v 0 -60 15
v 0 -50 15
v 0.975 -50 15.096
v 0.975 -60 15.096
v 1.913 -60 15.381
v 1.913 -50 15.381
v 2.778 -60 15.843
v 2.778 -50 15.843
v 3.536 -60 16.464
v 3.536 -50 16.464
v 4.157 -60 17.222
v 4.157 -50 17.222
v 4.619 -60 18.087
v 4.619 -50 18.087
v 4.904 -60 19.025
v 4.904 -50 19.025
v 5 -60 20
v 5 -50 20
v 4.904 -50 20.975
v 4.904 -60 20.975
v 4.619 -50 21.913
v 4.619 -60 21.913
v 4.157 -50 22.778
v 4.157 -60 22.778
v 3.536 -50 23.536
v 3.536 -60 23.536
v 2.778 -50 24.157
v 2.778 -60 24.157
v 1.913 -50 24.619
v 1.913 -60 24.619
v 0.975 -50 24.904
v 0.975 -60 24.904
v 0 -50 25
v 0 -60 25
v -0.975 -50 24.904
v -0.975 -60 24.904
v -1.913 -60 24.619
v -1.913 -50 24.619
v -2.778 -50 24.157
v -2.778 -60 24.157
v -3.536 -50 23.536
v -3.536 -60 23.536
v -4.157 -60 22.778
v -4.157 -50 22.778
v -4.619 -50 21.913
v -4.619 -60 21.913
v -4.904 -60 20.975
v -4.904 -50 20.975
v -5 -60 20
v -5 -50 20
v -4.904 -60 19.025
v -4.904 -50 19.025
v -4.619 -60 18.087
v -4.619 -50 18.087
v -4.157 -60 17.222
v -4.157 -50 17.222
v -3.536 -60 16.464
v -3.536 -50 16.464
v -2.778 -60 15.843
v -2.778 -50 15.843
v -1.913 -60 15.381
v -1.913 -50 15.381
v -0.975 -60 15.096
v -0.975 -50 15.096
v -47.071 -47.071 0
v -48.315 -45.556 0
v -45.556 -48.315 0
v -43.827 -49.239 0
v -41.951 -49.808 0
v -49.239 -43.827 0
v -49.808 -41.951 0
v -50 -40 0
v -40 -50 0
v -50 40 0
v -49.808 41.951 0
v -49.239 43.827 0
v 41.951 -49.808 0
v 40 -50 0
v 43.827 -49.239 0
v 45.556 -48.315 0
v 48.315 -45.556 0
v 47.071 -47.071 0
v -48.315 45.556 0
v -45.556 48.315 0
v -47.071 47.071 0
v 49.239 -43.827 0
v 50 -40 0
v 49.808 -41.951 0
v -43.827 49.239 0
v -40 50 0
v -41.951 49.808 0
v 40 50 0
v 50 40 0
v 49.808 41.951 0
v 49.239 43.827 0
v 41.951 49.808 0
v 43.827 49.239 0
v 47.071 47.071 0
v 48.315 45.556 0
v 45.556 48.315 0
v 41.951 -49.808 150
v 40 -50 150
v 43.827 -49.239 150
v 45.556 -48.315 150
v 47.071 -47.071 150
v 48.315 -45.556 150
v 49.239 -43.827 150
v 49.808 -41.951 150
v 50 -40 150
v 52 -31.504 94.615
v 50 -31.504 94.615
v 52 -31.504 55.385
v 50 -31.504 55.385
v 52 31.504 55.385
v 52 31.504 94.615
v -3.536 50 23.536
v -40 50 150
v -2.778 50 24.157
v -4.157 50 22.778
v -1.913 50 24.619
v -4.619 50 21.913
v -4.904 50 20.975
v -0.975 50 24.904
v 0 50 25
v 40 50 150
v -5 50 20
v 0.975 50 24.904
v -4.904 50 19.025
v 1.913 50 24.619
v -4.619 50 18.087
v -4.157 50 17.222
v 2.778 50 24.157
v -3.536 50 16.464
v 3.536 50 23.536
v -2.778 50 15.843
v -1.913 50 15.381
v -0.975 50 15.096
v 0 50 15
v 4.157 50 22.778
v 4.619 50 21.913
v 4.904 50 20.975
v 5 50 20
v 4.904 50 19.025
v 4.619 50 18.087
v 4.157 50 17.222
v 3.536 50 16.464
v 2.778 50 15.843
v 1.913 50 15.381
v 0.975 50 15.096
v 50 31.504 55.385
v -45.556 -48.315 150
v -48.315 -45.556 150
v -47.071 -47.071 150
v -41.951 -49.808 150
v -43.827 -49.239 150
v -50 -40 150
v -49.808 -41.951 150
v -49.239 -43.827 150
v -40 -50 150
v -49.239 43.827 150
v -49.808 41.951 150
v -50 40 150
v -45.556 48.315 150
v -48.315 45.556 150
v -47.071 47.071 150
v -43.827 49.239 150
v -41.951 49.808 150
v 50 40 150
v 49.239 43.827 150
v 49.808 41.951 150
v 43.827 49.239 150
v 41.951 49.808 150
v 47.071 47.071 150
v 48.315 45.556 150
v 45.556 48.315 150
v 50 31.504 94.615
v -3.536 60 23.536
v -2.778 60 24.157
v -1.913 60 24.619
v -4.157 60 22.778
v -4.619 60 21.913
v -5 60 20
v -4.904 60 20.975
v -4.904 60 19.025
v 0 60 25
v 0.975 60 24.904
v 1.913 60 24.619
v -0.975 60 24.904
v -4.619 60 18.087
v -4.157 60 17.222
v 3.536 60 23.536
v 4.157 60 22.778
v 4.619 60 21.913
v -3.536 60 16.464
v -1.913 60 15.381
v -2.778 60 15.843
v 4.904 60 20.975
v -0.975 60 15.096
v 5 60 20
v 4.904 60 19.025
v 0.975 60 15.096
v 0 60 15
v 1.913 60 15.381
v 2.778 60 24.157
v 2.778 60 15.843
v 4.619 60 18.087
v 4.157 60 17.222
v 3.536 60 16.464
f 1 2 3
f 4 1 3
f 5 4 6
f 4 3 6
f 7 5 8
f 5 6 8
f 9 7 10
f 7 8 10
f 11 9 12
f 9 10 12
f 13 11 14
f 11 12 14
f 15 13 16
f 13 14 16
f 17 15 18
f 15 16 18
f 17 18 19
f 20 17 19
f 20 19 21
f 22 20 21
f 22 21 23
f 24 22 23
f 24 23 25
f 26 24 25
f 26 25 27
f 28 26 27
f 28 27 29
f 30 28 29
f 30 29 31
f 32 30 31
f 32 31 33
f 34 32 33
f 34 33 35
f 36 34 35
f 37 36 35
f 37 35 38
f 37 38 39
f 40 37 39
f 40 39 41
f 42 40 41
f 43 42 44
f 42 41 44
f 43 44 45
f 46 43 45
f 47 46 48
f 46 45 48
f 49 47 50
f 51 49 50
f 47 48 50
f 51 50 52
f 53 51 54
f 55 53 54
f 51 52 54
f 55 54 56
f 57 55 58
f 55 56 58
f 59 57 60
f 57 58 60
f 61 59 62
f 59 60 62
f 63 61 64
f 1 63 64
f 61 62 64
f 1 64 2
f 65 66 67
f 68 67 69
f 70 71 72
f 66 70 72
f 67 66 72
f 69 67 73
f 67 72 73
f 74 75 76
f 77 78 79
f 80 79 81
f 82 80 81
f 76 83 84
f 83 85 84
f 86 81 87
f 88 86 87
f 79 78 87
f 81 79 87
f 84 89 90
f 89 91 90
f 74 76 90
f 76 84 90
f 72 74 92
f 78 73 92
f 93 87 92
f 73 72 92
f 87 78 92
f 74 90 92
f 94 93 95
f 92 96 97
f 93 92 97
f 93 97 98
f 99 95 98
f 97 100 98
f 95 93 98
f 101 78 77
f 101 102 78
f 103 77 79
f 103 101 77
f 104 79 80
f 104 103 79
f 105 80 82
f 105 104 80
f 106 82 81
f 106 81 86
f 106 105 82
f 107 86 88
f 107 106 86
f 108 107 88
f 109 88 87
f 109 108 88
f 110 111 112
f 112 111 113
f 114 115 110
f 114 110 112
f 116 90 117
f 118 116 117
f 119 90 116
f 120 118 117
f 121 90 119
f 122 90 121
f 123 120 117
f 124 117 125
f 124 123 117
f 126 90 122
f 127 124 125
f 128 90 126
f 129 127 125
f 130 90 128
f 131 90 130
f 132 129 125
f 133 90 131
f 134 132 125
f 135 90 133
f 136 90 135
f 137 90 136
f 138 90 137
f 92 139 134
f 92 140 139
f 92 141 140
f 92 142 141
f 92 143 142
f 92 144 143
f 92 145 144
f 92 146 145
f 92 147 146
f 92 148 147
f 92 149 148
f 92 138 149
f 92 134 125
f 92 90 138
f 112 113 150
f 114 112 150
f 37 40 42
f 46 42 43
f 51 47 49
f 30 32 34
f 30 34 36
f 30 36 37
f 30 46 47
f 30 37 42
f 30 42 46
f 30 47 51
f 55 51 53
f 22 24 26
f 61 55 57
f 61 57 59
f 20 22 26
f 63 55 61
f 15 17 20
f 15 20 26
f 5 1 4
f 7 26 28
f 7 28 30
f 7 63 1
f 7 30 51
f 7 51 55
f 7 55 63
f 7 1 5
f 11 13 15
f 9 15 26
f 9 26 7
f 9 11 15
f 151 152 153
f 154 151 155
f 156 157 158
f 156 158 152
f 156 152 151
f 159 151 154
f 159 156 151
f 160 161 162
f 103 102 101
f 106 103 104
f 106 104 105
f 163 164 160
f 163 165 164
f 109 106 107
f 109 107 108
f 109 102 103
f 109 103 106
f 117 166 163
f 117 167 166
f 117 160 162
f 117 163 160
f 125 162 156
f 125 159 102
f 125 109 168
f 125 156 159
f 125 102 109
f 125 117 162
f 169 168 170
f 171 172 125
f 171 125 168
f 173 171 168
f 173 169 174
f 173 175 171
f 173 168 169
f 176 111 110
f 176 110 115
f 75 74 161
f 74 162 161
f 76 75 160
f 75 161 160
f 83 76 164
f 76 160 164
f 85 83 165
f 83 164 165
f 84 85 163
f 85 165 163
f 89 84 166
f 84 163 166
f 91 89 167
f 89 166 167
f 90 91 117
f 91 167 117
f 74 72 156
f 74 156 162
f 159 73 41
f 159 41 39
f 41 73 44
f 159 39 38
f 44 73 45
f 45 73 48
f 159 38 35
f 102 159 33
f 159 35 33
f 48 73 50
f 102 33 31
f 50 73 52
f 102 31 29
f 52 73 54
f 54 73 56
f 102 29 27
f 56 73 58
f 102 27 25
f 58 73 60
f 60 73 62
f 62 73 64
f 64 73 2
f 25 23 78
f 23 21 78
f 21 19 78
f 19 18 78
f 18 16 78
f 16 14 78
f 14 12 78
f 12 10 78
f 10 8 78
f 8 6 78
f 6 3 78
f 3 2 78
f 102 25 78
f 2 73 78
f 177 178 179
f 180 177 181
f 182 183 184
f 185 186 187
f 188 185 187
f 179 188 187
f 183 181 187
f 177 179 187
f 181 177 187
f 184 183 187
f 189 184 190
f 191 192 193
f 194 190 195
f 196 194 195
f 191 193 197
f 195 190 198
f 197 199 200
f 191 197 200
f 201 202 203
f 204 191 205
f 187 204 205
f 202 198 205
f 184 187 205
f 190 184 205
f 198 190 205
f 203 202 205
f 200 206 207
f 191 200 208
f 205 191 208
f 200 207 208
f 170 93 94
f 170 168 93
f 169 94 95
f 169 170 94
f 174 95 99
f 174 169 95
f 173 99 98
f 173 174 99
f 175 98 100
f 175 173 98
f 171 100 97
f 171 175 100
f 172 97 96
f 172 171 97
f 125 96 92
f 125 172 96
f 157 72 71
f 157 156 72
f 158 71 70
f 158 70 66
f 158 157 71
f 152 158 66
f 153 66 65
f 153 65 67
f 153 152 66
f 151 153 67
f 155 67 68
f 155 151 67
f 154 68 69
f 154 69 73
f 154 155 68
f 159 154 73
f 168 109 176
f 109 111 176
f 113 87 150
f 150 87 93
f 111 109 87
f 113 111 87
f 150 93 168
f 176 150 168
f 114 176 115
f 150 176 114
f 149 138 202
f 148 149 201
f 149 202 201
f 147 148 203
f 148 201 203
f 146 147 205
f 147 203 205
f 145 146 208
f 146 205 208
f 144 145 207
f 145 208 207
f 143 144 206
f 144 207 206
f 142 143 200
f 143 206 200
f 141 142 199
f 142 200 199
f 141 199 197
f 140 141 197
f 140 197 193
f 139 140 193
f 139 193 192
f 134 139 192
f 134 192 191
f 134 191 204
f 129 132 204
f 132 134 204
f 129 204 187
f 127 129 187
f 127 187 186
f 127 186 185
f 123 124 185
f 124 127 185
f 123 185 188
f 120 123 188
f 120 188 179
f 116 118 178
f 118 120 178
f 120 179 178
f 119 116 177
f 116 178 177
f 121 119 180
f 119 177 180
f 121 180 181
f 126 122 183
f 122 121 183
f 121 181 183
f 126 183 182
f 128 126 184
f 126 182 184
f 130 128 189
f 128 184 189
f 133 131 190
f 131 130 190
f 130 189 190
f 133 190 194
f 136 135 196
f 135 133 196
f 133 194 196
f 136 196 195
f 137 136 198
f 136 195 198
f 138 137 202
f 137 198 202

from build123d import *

# Parameters (mm, degrees)
SKETCH1_W                = 100
SKETCH1_H                = 100
BOSS_EXTRUDE1_DEPTH      = 150
FILLET1_R                = 10
SKETCH2_W                = 39.23098356
SKETCH2_H                = 63.007337234
BOSS_EXTRUDE2_DEPTH      = 2
BOSS_EXTRUDE3_DEPTH      = 10
BOSS_EXTRUDE3_DEPTH_BACK = 110
SKETCH3_R                = 5


with BuildPart() as part:
    # Sketch1 → Boss-Extrude1 (new body)
    with BuildSketch(Plane.XY):
        Rectangle(SKETCH1_W, SKETCH1_H)
    extrude(amount=BOSS_EXTRUDE1_DEPTH)

    # Fillet1
    fillet1_edges = [part.edges().sort_by_distance(p)[0] for p in [
        (50, -50, 75),
        (-50, -50, 75),
        (-50, 50, 75),
        (50, 50, 75),
    ]]
    fillet(fillet1_edges, radius=FILLET1_R)

    # Sketch2 → Boss-Extrude2 (add)
    with BuildSketch(Plane(origin=(50, 0, 0), x_dir=(0, 0, -1), z_dir=(1, 0, 0))):
        with Locations((-75, 0)):
            Rectangle(SKETCH2_W, SKETCH2_H)
    extrude(amount=BOSS_EXTRUDE2_DEPTH)

    # Sketch3 → Boss-Extrude3 (add, two sides: drawn at the far end of the back side and taken through both)
    with BuildSketch(Plane.XZ.offset(50).offset(-BOSS_EXTRUDE3_DEPTH_BACK)):
        with Locations(Location((0, 20, 0), (0, 0, 270))):
            Circle(SKETCH3_R)
    extrude(amount=BOSS_EXTRUDE3_DEPTH + BOSS_EXTRUDE3_DEPTH_BACK)


solid = part.part
